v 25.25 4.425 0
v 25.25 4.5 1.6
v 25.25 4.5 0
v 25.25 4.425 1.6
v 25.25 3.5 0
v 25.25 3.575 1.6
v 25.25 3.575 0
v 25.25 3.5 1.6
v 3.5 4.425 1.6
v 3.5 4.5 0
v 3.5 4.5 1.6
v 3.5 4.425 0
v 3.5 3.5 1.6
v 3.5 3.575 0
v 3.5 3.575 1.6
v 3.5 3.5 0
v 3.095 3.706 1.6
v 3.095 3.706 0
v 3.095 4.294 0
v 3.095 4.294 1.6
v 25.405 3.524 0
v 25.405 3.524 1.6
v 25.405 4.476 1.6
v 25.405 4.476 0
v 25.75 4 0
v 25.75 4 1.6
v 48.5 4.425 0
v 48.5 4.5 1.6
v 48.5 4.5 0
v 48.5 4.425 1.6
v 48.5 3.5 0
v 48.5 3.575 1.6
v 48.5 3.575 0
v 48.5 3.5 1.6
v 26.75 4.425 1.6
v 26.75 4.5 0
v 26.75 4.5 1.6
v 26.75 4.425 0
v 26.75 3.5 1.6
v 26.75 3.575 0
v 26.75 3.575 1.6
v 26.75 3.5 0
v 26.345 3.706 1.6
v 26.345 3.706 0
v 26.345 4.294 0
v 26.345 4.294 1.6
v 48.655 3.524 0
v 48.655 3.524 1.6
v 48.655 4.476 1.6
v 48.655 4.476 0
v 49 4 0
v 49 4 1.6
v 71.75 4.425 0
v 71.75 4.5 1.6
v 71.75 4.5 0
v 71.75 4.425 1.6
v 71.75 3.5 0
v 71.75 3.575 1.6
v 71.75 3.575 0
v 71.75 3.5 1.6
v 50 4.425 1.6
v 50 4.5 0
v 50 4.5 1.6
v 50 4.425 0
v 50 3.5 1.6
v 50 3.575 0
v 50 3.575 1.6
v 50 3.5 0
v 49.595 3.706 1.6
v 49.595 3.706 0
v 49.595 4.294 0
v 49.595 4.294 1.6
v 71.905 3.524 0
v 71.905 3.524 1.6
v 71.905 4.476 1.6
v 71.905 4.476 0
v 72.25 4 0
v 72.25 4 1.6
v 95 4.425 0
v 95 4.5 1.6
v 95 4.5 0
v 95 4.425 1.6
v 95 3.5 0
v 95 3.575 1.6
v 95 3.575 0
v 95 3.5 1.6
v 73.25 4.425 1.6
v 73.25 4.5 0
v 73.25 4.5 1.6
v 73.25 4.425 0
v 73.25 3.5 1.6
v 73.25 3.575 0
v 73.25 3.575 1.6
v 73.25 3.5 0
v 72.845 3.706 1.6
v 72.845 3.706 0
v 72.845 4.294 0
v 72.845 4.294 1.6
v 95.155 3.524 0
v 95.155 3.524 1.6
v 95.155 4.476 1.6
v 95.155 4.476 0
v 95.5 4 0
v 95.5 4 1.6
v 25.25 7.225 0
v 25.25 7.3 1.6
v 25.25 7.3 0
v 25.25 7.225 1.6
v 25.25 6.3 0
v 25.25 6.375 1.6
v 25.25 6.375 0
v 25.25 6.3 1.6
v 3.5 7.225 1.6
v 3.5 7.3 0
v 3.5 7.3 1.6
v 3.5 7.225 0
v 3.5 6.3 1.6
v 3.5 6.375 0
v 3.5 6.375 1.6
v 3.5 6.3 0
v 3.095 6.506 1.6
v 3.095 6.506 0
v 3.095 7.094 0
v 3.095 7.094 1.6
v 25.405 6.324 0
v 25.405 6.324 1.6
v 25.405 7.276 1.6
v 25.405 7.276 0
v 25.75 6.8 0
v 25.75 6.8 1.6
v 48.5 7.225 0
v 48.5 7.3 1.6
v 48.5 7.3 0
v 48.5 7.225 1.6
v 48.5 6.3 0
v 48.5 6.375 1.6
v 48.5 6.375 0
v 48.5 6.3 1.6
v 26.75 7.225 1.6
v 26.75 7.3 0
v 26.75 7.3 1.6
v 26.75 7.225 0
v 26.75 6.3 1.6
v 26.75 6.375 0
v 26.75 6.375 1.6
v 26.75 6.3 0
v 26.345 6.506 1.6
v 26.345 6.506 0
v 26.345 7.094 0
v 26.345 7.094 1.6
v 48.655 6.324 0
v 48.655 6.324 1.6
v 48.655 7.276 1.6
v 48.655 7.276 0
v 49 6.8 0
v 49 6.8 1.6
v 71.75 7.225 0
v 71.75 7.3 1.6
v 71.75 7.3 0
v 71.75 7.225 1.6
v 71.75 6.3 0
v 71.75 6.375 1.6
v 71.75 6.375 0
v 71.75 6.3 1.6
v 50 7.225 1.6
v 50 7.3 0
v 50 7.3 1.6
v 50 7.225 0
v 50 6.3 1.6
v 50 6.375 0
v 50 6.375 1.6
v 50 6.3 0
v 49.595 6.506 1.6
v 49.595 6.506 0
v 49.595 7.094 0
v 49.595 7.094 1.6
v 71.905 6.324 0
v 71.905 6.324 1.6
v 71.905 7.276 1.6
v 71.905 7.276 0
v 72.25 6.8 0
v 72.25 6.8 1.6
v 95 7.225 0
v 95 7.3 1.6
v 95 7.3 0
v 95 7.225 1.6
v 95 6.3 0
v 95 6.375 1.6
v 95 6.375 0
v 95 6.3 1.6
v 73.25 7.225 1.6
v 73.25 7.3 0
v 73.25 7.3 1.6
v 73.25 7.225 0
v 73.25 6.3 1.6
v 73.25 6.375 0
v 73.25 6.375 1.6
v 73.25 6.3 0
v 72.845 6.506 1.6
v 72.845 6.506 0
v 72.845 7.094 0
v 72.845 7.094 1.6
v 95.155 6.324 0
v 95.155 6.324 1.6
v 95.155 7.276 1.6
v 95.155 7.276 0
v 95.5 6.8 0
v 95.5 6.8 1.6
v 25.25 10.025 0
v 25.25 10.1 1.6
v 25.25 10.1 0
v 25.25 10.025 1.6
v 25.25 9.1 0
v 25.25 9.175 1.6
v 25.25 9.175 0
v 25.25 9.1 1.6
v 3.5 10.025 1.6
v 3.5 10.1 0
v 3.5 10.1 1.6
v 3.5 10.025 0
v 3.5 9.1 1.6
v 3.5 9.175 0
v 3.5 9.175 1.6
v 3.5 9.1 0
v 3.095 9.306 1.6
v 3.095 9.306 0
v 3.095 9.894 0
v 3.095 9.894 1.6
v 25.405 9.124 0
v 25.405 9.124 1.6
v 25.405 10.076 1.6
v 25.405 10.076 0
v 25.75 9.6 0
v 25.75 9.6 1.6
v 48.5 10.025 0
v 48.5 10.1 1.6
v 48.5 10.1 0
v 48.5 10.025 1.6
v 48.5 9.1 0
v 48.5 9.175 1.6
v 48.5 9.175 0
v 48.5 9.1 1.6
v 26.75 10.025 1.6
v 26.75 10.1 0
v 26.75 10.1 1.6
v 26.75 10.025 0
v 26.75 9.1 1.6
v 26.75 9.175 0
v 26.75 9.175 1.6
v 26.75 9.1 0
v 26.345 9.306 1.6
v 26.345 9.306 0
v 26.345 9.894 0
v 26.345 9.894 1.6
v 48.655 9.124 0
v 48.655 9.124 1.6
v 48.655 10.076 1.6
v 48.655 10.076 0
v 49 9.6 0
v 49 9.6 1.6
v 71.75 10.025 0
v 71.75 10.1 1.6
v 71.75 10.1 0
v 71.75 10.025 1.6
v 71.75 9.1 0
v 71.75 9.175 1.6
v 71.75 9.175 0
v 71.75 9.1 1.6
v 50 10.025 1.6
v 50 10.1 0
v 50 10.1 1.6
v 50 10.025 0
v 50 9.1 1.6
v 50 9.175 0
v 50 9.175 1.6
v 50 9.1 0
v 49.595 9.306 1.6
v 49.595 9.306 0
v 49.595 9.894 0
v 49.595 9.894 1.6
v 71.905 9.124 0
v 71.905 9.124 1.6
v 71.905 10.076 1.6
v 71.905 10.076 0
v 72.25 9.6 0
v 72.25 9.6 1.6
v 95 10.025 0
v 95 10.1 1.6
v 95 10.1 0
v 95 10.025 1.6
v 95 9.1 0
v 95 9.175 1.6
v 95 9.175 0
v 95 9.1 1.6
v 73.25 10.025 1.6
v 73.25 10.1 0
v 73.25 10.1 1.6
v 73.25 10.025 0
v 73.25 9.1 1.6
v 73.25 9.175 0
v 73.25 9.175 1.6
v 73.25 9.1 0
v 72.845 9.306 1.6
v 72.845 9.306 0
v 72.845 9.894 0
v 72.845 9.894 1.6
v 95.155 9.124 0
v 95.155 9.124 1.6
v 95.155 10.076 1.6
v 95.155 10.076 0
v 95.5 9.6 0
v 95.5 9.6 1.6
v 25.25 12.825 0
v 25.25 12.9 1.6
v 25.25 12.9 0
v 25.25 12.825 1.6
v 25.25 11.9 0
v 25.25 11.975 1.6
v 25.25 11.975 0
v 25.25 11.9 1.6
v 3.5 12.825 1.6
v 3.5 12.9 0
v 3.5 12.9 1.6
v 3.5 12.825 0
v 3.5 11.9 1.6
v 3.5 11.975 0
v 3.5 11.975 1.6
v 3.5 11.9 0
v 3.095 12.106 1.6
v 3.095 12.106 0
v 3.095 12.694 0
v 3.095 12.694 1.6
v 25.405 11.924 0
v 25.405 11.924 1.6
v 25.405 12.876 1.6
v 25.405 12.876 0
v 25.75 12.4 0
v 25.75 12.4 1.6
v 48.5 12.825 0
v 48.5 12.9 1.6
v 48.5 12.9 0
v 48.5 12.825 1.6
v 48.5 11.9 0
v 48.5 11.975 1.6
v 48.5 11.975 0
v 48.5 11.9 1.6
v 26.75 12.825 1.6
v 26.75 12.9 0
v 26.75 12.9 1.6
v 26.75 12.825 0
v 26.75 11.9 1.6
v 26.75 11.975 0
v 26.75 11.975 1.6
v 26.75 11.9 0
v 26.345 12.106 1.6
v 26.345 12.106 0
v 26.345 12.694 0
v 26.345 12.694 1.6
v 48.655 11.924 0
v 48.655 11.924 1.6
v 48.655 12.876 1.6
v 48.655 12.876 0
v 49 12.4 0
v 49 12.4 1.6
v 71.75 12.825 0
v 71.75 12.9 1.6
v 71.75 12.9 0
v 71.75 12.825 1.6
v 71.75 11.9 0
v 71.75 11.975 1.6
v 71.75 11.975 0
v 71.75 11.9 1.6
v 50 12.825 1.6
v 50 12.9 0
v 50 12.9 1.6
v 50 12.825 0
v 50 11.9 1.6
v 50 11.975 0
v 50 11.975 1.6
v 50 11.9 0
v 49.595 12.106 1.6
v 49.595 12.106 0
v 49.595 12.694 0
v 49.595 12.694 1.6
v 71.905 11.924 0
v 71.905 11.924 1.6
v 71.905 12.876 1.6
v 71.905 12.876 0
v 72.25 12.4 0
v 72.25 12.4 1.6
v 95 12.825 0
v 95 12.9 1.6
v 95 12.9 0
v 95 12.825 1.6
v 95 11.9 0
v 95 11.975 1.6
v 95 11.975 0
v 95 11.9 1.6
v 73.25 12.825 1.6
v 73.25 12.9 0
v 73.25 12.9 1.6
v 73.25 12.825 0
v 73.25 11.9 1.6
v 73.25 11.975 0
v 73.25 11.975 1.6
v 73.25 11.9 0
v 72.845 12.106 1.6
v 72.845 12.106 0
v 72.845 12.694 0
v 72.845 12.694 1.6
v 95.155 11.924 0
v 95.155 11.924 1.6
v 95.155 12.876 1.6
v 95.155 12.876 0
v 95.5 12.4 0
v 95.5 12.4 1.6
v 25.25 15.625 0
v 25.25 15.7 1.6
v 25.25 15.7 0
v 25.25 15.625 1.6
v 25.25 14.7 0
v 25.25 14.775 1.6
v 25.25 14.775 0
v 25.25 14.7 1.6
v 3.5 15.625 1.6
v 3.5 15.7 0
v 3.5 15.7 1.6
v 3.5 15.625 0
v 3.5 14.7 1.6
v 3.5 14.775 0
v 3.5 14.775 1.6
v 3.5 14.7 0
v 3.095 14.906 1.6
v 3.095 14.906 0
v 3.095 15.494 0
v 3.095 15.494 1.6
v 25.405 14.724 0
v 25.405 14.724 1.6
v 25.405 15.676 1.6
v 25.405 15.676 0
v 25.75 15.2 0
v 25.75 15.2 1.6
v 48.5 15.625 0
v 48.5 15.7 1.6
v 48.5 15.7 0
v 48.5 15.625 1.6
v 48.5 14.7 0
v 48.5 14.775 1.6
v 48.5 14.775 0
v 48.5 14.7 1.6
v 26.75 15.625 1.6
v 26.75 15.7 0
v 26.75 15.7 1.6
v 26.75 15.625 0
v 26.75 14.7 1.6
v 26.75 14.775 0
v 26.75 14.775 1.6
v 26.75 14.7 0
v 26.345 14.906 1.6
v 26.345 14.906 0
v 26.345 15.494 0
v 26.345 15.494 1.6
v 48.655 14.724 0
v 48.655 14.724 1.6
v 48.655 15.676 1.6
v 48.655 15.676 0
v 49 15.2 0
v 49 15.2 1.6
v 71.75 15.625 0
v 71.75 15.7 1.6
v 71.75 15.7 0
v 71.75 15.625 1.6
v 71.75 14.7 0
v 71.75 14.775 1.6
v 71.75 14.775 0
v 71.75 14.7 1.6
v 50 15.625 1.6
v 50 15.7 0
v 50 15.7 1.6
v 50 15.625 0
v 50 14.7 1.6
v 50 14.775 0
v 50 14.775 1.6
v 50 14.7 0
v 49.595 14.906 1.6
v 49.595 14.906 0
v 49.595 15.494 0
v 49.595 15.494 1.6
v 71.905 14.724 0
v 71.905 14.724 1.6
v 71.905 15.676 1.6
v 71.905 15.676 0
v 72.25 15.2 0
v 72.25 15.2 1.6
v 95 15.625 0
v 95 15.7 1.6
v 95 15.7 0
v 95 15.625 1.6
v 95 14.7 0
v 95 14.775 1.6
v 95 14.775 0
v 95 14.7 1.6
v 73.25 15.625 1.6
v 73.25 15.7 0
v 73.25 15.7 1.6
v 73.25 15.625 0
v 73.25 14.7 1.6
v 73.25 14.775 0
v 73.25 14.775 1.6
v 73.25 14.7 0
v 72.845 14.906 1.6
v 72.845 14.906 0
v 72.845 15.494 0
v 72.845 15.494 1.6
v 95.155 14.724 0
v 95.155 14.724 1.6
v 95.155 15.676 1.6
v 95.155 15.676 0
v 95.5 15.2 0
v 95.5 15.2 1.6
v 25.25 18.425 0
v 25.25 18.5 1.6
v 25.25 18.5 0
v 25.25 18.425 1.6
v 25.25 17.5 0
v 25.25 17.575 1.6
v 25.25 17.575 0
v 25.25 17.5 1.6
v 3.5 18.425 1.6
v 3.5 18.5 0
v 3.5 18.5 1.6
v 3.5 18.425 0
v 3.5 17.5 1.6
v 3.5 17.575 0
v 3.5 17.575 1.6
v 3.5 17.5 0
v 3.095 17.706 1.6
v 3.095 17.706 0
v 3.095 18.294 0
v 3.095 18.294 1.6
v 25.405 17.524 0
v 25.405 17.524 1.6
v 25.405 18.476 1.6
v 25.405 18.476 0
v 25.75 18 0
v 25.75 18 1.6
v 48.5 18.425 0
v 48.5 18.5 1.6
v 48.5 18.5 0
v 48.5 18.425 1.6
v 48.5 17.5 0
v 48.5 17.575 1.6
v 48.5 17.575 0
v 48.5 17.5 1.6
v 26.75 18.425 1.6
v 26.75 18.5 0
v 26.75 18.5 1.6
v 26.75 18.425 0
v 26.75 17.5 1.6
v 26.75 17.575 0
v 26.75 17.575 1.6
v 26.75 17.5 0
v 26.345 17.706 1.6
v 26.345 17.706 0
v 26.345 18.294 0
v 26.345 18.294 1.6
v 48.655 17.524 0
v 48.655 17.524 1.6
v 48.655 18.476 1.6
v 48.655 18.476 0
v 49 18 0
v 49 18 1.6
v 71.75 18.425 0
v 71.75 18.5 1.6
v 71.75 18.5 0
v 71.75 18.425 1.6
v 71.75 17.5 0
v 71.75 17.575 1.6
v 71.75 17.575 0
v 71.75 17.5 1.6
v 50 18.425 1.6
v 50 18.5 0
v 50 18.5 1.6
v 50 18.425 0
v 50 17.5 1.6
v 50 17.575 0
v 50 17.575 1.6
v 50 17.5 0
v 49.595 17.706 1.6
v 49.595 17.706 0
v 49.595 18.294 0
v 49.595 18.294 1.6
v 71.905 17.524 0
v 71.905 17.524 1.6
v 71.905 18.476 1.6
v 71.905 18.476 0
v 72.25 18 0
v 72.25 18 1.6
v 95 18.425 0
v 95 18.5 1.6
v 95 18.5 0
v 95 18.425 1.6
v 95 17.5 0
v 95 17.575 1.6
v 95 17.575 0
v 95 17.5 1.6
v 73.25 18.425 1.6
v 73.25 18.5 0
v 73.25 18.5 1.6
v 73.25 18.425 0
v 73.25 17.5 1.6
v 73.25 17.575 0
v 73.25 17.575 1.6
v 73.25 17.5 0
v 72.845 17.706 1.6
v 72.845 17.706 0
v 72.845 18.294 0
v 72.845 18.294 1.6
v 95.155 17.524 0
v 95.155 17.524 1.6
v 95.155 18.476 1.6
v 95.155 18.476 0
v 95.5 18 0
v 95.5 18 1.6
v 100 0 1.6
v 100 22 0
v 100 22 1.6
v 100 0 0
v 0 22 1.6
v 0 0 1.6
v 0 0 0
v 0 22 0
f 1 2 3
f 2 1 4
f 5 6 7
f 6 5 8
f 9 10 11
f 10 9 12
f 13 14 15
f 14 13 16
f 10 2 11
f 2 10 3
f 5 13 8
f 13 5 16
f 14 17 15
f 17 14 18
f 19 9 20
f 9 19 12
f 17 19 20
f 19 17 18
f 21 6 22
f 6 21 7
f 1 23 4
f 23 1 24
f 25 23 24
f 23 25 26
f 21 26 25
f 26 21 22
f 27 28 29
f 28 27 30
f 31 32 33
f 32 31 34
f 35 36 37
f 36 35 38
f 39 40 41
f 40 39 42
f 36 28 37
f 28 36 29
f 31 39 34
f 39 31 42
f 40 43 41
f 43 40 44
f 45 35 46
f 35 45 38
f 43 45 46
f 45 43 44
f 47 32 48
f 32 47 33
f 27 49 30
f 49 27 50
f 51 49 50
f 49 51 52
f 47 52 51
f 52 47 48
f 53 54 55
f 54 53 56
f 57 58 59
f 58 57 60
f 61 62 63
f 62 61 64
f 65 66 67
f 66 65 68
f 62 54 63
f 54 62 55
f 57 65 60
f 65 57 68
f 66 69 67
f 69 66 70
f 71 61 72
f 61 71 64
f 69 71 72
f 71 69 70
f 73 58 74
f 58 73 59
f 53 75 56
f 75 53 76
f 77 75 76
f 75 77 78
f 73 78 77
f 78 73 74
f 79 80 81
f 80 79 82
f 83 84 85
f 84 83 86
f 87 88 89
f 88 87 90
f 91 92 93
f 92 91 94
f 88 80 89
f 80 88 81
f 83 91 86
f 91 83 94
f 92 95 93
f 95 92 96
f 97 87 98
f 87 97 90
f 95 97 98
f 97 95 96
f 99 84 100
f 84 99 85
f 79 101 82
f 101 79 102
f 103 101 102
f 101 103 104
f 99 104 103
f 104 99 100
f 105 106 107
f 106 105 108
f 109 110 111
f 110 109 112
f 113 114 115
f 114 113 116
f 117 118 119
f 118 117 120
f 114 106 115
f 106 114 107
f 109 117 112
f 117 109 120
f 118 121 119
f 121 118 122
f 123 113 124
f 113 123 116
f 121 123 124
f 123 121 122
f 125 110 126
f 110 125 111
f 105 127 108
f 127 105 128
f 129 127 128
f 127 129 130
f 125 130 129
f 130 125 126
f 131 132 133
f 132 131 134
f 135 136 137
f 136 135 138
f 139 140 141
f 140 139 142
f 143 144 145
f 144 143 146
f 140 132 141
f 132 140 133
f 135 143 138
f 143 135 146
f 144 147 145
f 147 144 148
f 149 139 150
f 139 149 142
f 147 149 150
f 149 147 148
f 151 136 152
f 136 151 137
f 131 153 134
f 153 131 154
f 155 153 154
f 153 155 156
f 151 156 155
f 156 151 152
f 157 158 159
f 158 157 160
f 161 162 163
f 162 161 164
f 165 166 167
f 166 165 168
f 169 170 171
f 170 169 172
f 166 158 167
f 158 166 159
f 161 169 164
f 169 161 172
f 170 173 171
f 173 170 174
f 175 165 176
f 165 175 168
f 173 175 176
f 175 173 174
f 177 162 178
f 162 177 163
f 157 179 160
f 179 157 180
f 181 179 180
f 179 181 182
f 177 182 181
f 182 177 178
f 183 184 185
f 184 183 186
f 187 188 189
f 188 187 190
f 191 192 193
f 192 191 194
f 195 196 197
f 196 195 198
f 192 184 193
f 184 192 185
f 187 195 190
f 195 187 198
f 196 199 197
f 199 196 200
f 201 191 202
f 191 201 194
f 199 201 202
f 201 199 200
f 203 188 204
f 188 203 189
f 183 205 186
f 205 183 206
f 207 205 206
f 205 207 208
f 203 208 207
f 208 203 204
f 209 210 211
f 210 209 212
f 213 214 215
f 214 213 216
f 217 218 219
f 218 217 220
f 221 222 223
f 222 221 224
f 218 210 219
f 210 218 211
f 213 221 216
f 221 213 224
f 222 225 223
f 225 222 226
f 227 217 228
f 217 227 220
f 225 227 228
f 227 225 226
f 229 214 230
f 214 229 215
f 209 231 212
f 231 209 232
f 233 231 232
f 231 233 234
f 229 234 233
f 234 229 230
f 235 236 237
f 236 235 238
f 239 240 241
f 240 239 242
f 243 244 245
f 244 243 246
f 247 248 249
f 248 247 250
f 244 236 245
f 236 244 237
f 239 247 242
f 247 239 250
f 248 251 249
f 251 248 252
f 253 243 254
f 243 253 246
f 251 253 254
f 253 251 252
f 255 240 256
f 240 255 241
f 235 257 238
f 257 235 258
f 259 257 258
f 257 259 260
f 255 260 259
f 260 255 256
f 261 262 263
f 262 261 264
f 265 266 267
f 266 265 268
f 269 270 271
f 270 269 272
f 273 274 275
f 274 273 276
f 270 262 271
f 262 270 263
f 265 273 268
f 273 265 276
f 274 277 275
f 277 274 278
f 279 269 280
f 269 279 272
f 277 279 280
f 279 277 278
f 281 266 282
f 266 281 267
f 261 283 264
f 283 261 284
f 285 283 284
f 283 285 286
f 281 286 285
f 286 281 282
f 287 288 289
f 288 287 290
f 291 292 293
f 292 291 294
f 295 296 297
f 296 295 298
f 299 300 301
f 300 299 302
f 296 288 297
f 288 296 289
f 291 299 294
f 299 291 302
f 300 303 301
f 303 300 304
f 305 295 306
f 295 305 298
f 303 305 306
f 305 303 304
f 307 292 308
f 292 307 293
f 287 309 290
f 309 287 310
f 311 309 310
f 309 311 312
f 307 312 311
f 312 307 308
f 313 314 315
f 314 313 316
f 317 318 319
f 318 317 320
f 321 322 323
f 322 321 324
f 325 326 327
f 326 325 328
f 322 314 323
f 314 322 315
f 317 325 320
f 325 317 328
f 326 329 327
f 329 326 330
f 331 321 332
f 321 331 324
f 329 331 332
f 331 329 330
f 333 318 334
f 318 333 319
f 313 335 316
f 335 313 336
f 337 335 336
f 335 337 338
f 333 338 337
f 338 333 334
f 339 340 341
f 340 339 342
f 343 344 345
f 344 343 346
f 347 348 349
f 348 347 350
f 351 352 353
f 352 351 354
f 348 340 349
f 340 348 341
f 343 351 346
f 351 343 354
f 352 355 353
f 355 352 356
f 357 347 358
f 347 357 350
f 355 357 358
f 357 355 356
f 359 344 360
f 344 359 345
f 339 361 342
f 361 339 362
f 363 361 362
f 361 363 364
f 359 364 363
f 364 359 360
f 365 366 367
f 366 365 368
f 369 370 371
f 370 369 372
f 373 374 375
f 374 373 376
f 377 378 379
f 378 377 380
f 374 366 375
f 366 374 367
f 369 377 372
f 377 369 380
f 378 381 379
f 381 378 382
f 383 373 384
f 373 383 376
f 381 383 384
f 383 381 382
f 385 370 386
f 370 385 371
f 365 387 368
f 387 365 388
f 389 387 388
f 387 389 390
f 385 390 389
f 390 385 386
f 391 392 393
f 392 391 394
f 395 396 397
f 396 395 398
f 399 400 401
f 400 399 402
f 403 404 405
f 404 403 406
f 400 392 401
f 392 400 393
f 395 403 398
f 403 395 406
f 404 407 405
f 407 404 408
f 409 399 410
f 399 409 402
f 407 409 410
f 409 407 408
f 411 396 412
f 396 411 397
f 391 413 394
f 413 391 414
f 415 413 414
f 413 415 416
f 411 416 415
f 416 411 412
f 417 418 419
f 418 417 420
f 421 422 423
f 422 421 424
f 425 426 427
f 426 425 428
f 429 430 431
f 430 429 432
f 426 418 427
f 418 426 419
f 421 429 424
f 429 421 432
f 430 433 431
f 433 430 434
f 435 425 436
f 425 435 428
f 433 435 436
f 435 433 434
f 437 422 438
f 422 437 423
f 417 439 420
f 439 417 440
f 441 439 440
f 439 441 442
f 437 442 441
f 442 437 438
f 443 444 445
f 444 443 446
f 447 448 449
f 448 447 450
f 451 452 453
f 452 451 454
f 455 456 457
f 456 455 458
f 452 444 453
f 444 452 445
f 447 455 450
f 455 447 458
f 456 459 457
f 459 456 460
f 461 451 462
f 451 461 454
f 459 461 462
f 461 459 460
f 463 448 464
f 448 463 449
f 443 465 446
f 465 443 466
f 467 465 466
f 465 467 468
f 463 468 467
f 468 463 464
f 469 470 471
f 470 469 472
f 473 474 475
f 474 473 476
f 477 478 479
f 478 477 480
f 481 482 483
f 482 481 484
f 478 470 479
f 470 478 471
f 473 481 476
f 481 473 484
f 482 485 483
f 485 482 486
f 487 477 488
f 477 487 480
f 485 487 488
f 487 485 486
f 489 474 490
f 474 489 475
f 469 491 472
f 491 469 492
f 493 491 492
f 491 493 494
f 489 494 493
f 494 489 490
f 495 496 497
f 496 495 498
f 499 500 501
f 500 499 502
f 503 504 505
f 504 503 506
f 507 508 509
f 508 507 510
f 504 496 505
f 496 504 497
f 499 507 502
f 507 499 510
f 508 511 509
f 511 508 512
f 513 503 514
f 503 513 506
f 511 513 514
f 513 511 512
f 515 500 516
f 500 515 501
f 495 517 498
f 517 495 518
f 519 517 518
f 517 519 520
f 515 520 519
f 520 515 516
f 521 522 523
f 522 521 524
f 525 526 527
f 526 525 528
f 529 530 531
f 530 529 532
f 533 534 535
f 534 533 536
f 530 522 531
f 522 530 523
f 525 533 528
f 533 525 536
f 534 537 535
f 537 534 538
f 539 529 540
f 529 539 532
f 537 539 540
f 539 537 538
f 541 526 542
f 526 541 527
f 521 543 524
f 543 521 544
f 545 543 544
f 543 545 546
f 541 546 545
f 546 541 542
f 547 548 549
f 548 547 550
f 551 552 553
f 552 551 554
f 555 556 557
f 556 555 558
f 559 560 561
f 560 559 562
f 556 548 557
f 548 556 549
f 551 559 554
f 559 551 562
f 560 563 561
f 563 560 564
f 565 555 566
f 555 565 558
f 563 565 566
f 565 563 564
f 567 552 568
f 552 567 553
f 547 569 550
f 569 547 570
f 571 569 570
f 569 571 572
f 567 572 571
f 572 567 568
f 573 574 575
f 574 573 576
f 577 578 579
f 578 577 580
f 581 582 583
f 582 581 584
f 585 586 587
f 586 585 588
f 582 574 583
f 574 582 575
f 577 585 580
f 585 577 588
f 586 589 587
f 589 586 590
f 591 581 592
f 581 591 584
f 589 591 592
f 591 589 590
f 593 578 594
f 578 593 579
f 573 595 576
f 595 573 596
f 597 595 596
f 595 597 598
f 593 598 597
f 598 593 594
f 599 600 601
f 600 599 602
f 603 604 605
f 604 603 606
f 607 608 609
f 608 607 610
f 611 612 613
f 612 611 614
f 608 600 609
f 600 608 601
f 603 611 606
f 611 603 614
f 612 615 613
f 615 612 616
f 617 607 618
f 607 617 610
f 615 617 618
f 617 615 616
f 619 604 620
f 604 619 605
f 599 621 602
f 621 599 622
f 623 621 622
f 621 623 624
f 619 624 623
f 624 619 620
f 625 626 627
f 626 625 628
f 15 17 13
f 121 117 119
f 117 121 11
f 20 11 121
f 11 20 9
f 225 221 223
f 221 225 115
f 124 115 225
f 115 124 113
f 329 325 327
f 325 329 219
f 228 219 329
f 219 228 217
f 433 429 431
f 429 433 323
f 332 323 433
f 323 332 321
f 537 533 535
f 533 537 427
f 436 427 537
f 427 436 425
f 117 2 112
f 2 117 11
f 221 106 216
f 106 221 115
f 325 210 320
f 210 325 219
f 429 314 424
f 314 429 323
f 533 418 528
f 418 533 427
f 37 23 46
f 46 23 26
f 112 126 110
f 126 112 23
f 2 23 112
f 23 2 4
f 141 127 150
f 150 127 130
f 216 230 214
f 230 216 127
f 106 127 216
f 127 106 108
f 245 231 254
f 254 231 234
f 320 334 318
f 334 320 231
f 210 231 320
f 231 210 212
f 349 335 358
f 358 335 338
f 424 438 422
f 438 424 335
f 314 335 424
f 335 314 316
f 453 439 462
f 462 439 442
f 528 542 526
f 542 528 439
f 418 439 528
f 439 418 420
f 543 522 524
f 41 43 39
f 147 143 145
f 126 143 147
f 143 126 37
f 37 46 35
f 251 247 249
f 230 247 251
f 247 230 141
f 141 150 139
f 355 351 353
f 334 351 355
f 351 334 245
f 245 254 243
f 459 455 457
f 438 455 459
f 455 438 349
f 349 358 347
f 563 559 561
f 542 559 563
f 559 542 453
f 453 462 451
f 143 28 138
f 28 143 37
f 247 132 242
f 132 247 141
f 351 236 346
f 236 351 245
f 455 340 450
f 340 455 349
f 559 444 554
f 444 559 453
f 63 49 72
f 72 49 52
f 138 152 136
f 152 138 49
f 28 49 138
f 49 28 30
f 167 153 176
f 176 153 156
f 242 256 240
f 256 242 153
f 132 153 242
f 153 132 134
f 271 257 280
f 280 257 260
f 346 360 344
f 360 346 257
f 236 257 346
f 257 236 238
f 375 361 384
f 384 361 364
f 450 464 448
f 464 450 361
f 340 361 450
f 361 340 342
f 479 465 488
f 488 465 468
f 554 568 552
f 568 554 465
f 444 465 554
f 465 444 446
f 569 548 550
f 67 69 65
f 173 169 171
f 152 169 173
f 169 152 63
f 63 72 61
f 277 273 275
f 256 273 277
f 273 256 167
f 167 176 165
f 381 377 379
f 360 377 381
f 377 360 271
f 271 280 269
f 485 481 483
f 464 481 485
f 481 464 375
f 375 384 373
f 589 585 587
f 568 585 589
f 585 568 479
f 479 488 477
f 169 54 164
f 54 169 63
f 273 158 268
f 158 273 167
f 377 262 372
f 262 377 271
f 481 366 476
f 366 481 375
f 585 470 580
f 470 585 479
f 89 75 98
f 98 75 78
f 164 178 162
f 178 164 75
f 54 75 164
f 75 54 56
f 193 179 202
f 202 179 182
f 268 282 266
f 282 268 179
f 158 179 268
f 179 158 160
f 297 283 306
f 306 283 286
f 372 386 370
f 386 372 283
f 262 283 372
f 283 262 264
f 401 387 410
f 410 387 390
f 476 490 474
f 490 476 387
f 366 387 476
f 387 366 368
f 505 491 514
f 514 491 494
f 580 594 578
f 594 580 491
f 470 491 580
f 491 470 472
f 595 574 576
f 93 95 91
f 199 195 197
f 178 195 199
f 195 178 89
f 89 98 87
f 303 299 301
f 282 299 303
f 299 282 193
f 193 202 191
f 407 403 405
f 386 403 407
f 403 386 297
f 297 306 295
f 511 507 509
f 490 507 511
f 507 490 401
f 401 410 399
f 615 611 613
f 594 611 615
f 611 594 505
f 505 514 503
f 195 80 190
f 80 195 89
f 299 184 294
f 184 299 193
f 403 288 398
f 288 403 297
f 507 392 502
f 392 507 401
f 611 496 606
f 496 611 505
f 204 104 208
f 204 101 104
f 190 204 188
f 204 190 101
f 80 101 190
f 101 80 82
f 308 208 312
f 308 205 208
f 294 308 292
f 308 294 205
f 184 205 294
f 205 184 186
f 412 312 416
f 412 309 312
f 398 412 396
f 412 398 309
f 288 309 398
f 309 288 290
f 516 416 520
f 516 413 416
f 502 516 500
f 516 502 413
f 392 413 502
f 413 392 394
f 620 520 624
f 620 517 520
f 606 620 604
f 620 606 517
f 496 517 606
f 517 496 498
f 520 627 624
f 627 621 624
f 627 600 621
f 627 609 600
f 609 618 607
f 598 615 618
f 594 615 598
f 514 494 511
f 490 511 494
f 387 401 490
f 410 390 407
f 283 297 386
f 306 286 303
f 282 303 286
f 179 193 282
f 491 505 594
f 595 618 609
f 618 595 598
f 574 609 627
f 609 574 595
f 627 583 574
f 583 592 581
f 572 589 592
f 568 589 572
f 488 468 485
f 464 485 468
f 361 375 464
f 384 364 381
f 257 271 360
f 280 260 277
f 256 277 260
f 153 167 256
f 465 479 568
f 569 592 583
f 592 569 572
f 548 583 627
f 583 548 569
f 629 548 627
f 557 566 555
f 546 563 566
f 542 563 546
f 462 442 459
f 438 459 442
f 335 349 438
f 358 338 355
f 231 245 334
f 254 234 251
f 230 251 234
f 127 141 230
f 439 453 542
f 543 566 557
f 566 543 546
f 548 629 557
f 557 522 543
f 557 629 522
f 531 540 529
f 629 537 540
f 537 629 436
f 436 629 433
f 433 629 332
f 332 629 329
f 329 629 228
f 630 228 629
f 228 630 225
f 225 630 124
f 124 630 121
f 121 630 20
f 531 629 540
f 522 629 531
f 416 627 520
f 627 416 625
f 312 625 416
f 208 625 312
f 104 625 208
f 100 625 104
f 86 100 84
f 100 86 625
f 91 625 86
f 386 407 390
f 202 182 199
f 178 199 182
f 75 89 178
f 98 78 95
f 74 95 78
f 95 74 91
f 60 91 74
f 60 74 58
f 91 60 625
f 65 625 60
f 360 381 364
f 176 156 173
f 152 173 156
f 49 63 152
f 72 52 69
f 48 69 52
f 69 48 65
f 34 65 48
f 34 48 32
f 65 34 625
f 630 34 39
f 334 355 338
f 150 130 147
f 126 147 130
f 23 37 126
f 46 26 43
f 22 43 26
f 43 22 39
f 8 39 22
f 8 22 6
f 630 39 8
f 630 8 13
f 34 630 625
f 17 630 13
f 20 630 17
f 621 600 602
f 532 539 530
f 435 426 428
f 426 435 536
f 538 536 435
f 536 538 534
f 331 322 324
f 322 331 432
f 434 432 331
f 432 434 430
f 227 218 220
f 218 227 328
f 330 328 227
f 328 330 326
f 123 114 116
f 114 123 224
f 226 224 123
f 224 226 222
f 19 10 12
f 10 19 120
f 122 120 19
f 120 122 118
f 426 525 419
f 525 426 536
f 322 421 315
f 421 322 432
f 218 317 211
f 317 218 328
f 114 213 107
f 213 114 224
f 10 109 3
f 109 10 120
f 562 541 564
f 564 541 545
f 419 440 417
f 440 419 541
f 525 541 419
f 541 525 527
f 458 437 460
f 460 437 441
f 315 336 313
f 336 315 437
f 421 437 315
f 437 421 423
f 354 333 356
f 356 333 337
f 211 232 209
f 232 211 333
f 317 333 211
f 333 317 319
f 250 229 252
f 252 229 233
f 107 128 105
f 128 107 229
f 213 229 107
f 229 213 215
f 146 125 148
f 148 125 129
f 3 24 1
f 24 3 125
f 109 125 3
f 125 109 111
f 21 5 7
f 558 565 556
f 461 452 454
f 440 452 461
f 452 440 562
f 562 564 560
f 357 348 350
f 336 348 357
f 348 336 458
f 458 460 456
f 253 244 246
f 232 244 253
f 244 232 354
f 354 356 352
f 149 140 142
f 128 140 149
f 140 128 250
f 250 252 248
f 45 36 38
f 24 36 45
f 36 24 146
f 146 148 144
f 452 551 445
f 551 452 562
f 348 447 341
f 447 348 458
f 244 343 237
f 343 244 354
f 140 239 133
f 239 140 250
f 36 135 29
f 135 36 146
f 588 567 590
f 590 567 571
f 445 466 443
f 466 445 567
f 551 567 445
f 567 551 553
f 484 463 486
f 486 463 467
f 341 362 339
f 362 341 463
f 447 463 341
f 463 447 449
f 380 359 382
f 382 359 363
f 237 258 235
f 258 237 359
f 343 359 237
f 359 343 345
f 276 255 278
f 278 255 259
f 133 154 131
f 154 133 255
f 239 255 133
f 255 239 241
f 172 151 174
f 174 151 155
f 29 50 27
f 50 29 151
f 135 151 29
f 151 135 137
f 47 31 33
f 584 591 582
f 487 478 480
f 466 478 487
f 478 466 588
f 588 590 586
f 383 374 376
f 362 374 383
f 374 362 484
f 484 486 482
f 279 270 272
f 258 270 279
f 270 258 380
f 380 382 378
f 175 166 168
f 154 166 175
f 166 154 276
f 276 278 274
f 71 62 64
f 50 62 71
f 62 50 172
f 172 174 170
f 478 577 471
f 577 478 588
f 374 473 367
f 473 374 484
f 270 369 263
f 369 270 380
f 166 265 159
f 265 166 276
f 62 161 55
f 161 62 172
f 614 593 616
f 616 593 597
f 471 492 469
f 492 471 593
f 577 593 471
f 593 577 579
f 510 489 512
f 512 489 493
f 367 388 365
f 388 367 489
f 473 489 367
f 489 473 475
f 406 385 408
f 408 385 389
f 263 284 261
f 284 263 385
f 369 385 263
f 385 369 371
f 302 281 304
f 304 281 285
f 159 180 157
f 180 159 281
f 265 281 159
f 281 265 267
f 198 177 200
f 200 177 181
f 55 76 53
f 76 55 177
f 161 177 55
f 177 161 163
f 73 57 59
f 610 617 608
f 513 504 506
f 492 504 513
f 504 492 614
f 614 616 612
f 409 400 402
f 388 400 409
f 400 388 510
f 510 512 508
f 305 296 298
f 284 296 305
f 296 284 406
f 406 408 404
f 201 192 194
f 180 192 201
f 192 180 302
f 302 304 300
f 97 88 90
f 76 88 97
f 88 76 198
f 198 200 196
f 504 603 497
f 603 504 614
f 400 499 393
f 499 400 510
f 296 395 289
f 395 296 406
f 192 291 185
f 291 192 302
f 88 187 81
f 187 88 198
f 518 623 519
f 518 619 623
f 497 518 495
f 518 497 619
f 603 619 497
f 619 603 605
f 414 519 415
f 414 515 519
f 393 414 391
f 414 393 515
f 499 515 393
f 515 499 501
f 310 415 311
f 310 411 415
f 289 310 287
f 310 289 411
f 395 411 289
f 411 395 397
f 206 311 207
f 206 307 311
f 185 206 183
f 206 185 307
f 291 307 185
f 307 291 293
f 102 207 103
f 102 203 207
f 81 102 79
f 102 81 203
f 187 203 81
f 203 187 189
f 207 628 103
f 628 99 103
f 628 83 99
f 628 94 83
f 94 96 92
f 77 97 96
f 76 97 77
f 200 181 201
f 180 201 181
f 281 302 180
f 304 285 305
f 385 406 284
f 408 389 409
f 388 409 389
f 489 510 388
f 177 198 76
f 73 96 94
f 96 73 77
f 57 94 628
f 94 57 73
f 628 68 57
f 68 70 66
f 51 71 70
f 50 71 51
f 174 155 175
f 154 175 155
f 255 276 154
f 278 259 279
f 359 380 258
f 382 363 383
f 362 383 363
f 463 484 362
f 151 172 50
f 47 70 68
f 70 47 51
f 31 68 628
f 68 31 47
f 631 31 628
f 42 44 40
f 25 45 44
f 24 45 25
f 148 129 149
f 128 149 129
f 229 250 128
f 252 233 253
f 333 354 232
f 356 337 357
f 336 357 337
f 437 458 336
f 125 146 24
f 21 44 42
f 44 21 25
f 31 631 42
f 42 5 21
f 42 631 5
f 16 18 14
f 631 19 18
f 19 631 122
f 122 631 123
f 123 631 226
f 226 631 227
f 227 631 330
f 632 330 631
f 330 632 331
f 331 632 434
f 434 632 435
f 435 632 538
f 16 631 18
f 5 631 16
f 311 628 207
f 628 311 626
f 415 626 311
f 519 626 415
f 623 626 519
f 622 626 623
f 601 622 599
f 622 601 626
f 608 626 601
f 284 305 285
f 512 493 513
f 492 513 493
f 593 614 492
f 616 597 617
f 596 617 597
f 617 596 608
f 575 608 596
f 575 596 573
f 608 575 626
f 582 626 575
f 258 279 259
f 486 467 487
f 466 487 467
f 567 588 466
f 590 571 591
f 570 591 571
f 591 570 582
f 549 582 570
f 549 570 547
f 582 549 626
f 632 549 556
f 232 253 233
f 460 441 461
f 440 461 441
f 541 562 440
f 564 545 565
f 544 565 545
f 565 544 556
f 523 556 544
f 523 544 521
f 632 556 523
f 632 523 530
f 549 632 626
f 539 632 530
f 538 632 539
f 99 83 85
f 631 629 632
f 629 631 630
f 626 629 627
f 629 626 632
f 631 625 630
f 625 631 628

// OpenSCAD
length = 100;
width = 22;
height = 1.6;
slot_width = 1.0;
margin = 3.5;

module slots() {
  n = 6;
  start = margin + 0.5*slot_width;
  end = width - start;
  delta = (end - start)/(n-1);
  slot_height = 1.1*height;
  
  for (i = [0:(n-1)]) {
    translate([margin, start + i*delta, -0.5*(slot_height-height)]) union() {
      bar_start = 0;
      bar_length = length - 2*margin;
      bar_end = bar_length - bar_start;
      bar_delta = (bar_end - bar_start)/4;
      echo(bar_start, bar_end, bar_delta);
      for(j = [0:3]) {
        echo(j, bar_start + j*bar_delta);
        translate([bar_start + j*bar_delta,0,0]) union() {
          translate([0,-0.5*slot_width,0]) cube([0.25*bar_length - 1.5*slot_width, slot_width, slot_height]);
          translate([0,0,0]) cylinder(d=slot_width, h=slot_height);
          translate([0.25*bar_length - 1.5*slot_width,0,0]) cylinder(d=slot_width, h=slot_height);
        };
      };
    };
  };
}

difference() {
  cube([length, width, height]);
  slots();
}
